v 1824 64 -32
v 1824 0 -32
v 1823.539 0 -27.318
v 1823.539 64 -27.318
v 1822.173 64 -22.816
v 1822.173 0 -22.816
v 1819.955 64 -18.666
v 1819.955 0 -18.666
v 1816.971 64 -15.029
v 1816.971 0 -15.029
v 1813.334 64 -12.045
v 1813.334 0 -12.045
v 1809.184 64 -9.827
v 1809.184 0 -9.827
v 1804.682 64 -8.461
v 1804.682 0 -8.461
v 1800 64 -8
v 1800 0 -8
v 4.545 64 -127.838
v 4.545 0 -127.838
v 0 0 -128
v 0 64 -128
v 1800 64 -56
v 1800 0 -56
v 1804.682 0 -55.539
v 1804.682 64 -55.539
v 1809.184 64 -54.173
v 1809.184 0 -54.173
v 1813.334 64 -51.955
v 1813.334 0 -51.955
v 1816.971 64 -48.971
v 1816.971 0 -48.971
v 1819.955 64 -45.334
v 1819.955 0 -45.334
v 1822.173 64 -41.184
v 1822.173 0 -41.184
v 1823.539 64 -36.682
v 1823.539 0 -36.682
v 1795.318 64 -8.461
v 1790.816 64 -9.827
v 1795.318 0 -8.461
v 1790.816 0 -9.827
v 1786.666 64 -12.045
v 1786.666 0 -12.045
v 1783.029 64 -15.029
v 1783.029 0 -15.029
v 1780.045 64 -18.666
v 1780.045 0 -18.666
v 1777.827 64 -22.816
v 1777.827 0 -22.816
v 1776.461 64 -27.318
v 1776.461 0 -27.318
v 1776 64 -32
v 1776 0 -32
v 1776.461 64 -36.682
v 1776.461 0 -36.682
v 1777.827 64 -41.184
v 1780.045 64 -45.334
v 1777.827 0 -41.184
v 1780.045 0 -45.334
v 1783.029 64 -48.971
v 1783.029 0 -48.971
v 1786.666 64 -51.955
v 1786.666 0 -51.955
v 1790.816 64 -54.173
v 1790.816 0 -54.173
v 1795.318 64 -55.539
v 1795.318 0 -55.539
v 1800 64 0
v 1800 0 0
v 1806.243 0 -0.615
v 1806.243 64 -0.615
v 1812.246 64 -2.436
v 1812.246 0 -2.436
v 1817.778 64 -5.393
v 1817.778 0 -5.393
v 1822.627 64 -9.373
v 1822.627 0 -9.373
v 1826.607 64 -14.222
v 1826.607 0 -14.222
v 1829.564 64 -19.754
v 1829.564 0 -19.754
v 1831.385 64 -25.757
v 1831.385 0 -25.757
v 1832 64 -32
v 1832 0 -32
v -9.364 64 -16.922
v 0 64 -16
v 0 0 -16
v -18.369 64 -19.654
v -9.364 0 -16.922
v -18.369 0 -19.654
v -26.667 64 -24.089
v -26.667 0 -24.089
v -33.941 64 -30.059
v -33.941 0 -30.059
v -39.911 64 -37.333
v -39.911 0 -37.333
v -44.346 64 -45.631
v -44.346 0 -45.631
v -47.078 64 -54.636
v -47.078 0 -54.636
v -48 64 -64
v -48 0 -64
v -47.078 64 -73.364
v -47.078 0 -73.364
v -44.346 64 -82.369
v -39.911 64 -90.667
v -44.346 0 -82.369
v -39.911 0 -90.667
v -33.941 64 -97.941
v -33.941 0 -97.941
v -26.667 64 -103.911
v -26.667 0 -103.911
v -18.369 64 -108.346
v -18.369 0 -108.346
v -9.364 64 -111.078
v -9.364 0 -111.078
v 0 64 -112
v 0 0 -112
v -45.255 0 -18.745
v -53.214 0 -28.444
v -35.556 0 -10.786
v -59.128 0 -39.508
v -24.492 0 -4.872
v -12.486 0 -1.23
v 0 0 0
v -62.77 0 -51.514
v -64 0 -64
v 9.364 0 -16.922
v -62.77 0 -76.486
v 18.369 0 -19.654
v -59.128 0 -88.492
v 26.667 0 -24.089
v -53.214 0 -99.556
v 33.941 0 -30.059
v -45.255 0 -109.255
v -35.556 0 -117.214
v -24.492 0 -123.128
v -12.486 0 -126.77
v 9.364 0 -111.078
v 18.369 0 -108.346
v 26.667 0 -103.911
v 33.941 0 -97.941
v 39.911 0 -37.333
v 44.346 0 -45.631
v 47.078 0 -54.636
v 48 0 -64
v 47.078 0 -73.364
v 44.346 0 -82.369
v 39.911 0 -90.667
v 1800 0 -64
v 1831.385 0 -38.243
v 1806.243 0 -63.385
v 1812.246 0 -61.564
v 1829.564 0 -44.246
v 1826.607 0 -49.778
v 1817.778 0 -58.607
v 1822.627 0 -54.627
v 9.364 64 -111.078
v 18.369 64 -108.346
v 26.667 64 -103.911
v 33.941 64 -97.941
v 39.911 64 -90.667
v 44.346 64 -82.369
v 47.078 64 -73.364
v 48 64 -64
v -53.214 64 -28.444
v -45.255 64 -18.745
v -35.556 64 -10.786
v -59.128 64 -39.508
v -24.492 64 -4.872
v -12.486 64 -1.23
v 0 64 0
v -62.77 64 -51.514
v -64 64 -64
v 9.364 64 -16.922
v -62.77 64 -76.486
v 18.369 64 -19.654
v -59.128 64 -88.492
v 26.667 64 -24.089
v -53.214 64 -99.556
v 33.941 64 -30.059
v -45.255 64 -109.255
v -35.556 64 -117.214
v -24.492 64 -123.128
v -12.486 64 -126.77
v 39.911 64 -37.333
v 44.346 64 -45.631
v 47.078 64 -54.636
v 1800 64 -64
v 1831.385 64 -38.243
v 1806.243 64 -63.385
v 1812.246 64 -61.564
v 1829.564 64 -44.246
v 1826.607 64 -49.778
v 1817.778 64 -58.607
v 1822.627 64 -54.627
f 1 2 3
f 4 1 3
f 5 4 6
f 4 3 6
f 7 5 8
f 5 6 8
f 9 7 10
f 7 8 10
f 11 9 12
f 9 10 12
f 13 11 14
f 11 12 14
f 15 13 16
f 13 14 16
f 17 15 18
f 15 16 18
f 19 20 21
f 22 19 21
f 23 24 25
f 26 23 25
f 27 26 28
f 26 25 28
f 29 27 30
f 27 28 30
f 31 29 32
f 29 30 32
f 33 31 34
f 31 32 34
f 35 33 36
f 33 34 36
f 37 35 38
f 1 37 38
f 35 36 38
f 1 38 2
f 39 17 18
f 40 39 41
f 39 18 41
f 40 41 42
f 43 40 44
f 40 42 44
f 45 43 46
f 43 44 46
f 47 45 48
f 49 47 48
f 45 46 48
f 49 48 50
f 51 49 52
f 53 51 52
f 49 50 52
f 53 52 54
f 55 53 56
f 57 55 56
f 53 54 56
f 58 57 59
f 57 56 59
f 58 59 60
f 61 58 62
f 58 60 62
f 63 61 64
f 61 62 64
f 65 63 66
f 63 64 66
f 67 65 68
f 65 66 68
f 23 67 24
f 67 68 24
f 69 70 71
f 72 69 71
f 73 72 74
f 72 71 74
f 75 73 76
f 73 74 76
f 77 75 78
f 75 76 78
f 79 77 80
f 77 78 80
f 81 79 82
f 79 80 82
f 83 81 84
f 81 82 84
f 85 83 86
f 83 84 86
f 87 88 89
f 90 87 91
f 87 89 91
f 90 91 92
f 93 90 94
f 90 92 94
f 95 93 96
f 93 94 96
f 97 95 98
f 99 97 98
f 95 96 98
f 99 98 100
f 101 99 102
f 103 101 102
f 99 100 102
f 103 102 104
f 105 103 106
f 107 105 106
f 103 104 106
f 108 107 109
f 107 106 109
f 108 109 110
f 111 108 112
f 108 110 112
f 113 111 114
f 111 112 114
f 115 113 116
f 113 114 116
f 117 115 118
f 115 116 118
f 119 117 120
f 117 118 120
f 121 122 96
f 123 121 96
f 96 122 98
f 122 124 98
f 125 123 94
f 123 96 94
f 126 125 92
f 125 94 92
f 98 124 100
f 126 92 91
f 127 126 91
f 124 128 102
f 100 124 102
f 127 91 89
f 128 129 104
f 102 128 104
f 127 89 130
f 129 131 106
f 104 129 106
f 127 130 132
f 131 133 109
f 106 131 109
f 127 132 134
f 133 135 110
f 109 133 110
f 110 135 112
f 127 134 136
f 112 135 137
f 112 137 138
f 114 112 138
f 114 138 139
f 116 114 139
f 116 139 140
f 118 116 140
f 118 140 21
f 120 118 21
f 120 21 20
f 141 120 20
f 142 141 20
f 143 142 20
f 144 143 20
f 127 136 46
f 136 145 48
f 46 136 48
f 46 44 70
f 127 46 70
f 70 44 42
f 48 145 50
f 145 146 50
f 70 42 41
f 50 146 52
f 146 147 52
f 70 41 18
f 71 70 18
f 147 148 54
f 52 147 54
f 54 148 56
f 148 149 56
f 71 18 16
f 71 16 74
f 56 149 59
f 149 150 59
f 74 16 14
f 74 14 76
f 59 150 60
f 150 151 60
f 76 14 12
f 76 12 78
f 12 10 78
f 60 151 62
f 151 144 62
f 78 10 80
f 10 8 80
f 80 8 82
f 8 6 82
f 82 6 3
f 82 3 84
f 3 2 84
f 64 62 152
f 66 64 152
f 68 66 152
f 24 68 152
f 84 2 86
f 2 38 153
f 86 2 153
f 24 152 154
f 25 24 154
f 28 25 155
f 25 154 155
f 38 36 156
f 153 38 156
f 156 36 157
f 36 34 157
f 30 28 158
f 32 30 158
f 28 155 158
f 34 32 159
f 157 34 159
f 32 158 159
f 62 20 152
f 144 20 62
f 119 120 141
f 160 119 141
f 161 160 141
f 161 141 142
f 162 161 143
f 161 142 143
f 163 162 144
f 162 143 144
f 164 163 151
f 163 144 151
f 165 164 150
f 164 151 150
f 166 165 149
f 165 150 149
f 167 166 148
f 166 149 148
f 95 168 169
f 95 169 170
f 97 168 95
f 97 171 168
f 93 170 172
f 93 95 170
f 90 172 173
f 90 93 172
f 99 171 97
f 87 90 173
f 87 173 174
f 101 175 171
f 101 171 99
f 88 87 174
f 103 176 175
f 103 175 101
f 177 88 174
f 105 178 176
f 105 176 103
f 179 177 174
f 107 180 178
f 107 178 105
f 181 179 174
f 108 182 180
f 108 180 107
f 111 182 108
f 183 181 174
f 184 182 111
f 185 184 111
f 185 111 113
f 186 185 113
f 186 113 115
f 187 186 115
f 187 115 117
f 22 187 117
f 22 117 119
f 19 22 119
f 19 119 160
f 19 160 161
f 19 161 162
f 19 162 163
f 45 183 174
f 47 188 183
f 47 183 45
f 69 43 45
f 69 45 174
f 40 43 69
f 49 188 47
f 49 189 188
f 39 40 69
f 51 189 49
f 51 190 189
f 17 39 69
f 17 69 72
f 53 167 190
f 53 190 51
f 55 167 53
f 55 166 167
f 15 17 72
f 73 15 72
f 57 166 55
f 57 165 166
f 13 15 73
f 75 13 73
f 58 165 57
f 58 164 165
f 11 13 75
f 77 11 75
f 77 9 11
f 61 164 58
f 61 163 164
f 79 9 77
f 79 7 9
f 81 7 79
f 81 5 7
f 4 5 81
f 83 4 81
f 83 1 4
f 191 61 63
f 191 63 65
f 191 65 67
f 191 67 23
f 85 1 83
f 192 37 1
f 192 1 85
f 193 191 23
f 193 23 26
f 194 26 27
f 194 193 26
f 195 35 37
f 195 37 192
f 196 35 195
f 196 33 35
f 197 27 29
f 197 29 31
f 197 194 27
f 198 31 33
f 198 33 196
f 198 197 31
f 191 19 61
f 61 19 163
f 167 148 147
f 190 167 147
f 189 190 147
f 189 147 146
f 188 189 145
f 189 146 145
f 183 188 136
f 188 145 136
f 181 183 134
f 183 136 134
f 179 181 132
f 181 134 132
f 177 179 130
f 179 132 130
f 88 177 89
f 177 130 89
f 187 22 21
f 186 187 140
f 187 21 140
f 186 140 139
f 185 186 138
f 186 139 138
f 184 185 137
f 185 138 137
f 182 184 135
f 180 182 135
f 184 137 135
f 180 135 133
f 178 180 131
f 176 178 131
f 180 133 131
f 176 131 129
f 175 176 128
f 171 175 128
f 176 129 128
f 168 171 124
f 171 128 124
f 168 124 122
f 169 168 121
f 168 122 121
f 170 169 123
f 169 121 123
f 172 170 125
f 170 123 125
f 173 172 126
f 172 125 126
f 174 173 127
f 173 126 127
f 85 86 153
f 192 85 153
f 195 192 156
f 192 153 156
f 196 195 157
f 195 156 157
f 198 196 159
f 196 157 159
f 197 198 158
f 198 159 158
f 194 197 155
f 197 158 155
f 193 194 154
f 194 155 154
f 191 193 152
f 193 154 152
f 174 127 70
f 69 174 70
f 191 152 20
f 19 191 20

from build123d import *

# Parameters (mm, degrees)
BOSS_EXTRUDE1_DEPTH = 64


with BuildPart() as part:
    # Sketch1 → Boss-Extrude1 (new body)
    with BuildSketch(Plane(origin=(0, 0, 0), x_dir=(1, 0, 0), z_dir=(0, 1, 0))):
        with BuildLine():
            ThreePointArc((64, 64), (45.254833996, 18.745166004), (0, 0))
            Line((0, 0), (1800, 0))
            ThreePointArc((1800, 0), (1768, 32), (1800, 64))
            Line((1800, 64), (4.545364872, 127.838387027))
            ThreePointArc((4.545364872, 127.838387027), (46.834300207, 107.618210923), (64, 64))
        make_face()
        with BuildLine():
            ThreePointArc((0, 128), (-64, 64), (0, 0))
            Line((0, 0), (0, 16))
            ThreePointArc((0, 16), (-48, 64), (0, 112))
            Line((0, 112), (0, 128))
        make_face()
        with BuildLine():
            Line((0, 16), (0, 0))
            ThreePointArc((0, 0), (45.254833996, 18.745166004), (64, 64))
            ThreePointArc((64, 64), (46.834300207, 107.618210923), (4.545364872, 127.838387027))
            Line((4.545364872, 127.838387027), (0, 128))
            Line((0, 128), (0, 112))
            ThreePointArc((0, 112), (33.941125497, 97.941125497), (48, 64))
            ThreePointArc((48, 64), (33.941125497, 30.058874503), (0, 16))
        make_face()
        with BuildLine():
            ThreePointArc((1800, 64), (1768, 32), (1800, 0))
            Line((1800, 0), (1800, 8))
            ThreePointArc((1800, 8), (1776, 32), (1800, 56))
            Line((1800, 56), (1800, 64))
        make_face()
        with BuildLine():
            Line((1800, 8), (1800, 0))
            ThreePointArc((1800, 0), (1822.627416998, 9.372583002), (1832, 32))
            ThreePointArc((1832, 32), (1822.627416998, 54.627416998), (1800, 64))
            Line((1800, 64), (1800, 56))
            ThreePointArc((1800, 56), (1816.970562748, 48.970562748), (1824, 32))
            ThreePointArc((1824, 32), (1816.970562748, 15.029437252), (1800, 8))
        make_face()
    extrude(amount=BOSS_EXTRUDE1_DEPTH)


solid = part.part
